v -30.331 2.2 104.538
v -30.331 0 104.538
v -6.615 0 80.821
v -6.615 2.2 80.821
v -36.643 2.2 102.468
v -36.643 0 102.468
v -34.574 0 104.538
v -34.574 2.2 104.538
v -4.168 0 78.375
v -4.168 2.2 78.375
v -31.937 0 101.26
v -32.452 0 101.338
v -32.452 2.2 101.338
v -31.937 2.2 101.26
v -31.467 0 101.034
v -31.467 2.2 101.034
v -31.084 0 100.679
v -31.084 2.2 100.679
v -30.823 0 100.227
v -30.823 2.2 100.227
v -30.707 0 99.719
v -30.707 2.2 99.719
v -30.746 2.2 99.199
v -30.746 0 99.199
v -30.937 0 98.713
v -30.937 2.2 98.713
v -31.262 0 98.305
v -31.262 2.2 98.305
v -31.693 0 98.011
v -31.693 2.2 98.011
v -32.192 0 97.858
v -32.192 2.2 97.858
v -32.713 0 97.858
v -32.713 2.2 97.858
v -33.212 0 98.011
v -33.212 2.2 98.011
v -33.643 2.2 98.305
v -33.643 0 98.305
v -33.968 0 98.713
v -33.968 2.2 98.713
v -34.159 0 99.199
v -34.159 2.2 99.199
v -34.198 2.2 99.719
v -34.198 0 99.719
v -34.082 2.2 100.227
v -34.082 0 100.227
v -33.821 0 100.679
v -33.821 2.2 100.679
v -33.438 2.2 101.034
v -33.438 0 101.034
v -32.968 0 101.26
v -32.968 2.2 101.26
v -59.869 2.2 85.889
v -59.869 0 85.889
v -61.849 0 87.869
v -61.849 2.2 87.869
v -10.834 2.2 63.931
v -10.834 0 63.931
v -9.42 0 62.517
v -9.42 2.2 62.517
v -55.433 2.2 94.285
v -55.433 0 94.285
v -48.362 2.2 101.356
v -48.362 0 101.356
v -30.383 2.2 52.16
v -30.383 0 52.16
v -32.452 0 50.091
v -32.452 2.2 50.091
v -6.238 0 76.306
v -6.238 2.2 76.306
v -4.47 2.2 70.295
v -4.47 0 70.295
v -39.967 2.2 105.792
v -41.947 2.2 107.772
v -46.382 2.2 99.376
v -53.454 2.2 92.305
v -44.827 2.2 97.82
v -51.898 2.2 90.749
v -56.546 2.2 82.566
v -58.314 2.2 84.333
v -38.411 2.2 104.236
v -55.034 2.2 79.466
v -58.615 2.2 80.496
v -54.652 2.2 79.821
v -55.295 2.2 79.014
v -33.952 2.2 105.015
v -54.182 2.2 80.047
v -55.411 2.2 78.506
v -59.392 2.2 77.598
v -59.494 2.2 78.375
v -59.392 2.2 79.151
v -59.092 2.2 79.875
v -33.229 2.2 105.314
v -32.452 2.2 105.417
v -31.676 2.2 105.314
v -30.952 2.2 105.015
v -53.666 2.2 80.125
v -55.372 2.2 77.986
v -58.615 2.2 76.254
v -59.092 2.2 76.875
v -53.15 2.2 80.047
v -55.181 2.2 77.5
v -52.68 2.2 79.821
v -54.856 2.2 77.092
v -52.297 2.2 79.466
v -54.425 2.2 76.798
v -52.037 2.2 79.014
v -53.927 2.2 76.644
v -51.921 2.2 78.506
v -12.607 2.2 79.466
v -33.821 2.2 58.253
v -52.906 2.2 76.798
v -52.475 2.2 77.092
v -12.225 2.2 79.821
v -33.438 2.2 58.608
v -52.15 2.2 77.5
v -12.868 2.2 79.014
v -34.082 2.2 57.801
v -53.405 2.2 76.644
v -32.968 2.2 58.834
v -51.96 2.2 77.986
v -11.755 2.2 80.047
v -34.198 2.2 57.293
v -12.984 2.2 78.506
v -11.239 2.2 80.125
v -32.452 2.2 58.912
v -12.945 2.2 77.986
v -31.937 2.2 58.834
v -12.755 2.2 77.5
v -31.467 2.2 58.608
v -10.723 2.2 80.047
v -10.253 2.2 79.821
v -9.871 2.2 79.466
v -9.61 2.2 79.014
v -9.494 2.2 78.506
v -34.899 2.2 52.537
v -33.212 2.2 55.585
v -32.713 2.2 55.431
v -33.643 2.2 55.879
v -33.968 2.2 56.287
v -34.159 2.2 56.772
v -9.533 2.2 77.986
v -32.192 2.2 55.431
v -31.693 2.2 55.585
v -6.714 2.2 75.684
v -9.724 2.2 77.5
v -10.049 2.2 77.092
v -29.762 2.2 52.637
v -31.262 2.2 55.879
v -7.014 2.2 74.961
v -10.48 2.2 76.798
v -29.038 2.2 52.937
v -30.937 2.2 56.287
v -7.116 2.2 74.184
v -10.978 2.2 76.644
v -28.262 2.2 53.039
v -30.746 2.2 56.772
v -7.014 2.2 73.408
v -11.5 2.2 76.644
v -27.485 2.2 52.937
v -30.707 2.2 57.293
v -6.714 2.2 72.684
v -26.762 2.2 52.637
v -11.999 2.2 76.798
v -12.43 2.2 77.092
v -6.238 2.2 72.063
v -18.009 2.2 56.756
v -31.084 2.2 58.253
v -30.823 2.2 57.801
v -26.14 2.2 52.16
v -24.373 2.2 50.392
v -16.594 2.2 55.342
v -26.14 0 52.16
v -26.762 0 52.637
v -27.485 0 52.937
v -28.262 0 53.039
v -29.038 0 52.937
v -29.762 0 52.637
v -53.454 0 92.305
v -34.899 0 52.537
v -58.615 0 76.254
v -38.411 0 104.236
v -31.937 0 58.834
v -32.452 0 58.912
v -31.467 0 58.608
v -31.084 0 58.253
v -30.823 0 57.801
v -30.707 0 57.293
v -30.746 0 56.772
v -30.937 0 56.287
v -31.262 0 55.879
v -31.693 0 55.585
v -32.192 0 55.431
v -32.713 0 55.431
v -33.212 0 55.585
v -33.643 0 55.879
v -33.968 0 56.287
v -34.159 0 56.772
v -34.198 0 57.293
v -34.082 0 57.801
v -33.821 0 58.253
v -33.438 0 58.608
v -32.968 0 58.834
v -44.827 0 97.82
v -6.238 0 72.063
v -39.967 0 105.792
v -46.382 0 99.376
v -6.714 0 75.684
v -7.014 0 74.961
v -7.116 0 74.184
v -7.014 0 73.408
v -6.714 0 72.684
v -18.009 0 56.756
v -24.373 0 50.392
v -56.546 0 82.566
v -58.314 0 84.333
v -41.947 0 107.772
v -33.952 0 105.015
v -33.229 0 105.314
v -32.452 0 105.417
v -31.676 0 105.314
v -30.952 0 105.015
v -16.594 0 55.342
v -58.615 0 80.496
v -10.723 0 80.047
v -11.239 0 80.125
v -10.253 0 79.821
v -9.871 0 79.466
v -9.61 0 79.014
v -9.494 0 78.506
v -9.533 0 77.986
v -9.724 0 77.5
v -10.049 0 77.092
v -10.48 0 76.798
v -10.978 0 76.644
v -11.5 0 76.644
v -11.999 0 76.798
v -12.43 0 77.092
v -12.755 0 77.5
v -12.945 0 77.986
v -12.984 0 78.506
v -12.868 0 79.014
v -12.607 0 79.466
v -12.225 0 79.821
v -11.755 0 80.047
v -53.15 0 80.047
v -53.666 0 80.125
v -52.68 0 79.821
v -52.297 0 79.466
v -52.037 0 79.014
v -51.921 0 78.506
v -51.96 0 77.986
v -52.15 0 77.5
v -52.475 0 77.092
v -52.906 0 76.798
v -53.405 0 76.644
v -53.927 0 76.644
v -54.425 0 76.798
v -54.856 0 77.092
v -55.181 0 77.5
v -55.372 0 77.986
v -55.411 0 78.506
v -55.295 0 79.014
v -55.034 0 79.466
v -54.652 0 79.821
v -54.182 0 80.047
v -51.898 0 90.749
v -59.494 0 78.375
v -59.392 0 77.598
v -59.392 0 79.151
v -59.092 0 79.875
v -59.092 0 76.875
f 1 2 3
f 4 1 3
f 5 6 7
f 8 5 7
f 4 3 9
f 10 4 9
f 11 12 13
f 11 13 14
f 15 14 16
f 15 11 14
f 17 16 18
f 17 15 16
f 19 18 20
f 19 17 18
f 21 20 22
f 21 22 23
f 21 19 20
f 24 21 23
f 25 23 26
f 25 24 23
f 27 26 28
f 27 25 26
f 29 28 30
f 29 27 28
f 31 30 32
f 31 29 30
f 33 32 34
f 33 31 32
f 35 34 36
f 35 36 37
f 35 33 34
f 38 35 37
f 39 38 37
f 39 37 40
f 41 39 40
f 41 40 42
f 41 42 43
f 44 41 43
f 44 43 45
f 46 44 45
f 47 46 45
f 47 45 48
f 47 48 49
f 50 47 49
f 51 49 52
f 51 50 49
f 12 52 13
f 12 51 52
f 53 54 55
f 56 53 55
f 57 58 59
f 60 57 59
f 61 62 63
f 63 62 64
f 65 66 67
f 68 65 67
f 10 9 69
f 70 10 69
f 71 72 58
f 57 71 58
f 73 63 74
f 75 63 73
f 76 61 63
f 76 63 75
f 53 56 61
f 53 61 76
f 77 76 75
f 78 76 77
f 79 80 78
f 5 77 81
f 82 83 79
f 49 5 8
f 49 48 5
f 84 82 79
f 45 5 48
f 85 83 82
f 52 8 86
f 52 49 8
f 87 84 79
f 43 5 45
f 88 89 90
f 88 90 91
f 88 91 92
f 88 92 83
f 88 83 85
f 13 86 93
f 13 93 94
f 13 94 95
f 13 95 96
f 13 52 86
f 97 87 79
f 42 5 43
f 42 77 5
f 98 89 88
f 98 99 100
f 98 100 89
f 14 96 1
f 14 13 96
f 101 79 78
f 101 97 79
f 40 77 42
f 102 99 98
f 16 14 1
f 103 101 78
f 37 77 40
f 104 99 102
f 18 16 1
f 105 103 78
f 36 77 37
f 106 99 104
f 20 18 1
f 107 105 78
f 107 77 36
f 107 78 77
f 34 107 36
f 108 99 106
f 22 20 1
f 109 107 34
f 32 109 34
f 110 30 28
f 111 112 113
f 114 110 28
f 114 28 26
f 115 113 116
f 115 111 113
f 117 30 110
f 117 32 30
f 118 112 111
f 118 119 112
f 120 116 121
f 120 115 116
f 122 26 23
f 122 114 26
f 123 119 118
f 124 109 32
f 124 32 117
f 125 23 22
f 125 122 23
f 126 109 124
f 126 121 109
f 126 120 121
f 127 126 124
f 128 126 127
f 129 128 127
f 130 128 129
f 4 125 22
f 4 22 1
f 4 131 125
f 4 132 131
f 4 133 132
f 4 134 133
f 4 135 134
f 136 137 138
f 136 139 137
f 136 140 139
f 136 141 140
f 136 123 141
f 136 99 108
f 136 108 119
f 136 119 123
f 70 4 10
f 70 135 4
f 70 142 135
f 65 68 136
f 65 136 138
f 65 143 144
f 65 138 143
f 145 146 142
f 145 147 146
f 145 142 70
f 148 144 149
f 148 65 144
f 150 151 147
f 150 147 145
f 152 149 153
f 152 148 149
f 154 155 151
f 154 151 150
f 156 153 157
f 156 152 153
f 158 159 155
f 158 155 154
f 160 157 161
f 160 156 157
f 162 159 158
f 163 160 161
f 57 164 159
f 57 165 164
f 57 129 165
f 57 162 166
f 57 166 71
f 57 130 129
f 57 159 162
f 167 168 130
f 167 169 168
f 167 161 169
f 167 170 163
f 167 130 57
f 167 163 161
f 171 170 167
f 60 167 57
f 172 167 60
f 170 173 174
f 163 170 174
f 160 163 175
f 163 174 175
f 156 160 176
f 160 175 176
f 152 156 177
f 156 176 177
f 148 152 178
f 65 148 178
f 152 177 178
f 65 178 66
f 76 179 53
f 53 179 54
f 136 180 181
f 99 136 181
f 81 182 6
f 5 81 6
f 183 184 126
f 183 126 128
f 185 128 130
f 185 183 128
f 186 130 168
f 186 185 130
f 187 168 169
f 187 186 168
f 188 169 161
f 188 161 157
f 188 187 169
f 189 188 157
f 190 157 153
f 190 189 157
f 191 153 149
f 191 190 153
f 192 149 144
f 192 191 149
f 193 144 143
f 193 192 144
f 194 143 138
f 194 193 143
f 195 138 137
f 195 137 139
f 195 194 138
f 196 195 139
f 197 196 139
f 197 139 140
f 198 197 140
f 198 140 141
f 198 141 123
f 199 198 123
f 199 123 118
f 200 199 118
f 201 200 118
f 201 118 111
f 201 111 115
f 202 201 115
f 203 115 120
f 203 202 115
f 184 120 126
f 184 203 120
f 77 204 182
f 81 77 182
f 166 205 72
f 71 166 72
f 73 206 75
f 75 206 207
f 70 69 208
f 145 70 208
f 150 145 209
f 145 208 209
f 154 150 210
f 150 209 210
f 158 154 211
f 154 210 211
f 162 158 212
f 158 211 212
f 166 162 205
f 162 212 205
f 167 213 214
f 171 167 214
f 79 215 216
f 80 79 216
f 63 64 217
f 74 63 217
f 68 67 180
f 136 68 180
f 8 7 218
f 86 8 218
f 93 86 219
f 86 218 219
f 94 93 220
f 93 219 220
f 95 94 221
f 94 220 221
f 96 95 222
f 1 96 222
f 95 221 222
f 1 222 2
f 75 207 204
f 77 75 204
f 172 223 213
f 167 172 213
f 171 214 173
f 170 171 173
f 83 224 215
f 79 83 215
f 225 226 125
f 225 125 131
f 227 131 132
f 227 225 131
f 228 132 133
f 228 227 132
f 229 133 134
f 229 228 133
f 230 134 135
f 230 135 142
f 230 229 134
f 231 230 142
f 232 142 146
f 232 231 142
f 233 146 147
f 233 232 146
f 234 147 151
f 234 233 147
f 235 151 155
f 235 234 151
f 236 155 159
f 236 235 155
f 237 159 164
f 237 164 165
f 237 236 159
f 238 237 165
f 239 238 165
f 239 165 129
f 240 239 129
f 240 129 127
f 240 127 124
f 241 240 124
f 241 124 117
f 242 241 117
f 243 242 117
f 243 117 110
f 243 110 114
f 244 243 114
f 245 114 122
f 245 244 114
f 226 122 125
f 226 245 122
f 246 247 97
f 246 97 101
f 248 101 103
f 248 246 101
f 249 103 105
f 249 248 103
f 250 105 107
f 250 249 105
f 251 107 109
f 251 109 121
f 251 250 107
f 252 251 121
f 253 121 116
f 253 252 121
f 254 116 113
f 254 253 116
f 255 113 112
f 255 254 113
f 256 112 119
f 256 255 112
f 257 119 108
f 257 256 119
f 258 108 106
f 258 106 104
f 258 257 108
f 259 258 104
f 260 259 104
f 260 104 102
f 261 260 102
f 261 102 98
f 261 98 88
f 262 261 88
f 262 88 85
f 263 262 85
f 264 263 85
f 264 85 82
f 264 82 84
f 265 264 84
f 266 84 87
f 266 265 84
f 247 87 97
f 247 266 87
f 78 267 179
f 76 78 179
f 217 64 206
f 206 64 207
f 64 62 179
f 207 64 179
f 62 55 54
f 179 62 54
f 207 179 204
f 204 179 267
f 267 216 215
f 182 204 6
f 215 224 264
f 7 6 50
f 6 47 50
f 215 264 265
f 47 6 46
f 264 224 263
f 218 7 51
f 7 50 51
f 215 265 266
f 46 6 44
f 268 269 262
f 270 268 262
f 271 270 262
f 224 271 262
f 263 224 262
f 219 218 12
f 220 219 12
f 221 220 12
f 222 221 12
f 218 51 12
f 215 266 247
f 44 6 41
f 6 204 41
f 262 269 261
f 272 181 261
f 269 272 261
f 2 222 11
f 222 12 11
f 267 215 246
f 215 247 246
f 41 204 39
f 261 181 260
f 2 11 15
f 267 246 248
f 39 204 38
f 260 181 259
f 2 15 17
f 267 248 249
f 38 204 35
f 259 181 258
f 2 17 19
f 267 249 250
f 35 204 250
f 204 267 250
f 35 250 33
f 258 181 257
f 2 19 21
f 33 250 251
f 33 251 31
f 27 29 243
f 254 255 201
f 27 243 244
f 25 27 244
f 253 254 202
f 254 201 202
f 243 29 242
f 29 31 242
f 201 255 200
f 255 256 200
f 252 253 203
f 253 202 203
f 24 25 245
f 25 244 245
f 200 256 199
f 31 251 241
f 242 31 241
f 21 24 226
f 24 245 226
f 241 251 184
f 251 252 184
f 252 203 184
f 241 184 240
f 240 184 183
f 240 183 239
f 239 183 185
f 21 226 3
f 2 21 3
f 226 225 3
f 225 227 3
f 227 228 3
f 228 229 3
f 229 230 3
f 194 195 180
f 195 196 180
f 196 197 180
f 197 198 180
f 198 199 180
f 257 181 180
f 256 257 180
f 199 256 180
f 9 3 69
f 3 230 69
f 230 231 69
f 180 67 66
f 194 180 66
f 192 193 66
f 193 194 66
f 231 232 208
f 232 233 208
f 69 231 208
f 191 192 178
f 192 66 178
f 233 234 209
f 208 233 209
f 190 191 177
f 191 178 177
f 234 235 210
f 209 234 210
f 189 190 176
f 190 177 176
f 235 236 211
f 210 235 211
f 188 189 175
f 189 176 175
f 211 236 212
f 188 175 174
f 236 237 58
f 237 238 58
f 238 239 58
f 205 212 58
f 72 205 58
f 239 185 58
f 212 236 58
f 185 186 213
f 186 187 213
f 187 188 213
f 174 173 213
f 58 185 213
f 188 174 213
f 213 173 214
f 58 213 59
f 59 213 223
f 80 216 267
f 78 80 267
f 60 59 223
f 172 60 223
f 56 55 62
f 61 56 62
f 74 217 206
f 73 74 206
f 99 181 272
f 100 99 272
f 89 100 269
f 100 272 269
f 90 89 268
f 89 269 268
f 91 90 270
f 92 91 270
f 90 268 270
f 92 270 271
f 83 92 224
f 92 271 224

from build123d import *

# Parameters (mm, degrees)
SKETCH1_R           = 1.75
BOSS_EXTRUDE1_DEPTH = 2.2


with BuildPart() as part:
    # Sketch1 → Boss-Extrude1 (new body)
    with BuildSketch(Plane(origin=(0, 0, 0), x_dir=(1, 0, 0), z_dir=(0, 1, 0))):
        with BuildLine():
            Line((-32.452490814, -50.090677738), (-34.898824615, -52.53701154))
            Line((-34.898824615, -52.53701154), (-58.615441718, -76.253628642))
            ThreePointArc((-58.615441718, -76.253628642), (-59.494121374, -78.374948986), (-58.615441718, -80.496269329))
            Line((-58.615441718, -80.496269329), (-56.546018533, -82.565692514))
            Line((-56.546018533, -82.565692514), (-58.313785486, -84.333459467))
            Line((-58.313785486, -84.333459467), (-51.897927296, -90.749317656))
            Line((-51.897927296, -90.749317656), (-53.453562215, -92.304952575))
            Line((-53.453562215, -92.304952575), (-59.869420404, -85.889094386))
            Line((-59.869420404, -85.889094386), (-61.849319392, -87.868993373))
            Line((-61.849319392, -87.868993373), (-55.433461202, -94.284851562))
            Line((-55.433461202, -94.284851562), (-48.36239339, -101.355919374))
            Line((-48.36239339, -101.355919374), (-41.946535201, -107.771777564))
            Line((-41.946535201, -107.771777564), (-39.966636214, -105.791878576))
            Line((-39.966636214, -105.791878576), (-46.382494403, -99.376020387))
            Line((-46.382494403, -99.376020387), (-44.826859485, -97.820385468))
            Line((-44.826859485, -97.820385468), (-38.411001295, -104.236243658))
            Line((-38.411001295, -104.236243658), (-36.643234342, -102.468476705))
            Line((-36.643234342, -102.468476705), (-34.573811157, -104.53789989))
            ThreePointArc((-34.573811157, -104.53789989), (-32.452490814, -105.416579546), (-30.33117047, -104.53789989))
            Line((-30.33117047, -104.53789989), (-6.614553368, -80.821282787))
            Line((-6.614553368, -80.821282787), (-4.168219566, -78.374948986))
            Line((-4.168219566, -78.374948986), (-6.237642751, -76.305525801))
            ThreePointArc((-6.237642751, -76.305525801), (-7.116322408, -74.184205457), (-6.237642751, -72.062885114))
            Line((-6.237642751, -72.062885114), (-4.469875798, -70.295118161))
            Line((-4.469875798, -70.295118161), (-10.833836829, -63.93115713))
            Line((-10.833836829, -63.93115713), (-9.419623267, -62.516943568))
            Line((-9.419623267, -62.516943568), (-16.594485396, -55.342081438))
            Line((-16.594485396, -55.342081438), (-18.008698958, -56.756295001))
            Line((-18.008698958, -56.756295001), (-24.372659989, -50.39233397))
            Line((-24.372659989, -50.39233397), (-26.140426942, -52.160100923))
            ThreePointArc((-26.140426942, -52.160100923), (-28.261747285, -53.03878058), (-30.383067629, -52.160100923))
            Line((-30.383067629, -52.160100923), (-32.452490814, -50.090677738))
        make_face()
        with Locations(Location((-32.452490814, -99.588152421, 0), (0, 0, 270))):
            Circle(SKETCH1_R, mode=Mode.SUBTRACT)
        with Locations(Location((-53.665694249, -78.374948986, 0), (0, 0, 270))):
            Circle(SKETCH1_R, mode=Mode.SUBTRACT)
        with Locations(Location((-11.239287378, -78.374948986, 0), (0, 0, 270))):
            Circle(SKETCH1_R, mode=Mode.SUBTRACT)
        with Locations(Location((-32.452490814, -57.16174555, 0), (0, 0, 270))):
            Circle(SKETCH1_R, mode=Mode.SUBTRACT)
    extrude(amount=BOSS_EXTRUDE1_DEPTH)


solid = part.part
